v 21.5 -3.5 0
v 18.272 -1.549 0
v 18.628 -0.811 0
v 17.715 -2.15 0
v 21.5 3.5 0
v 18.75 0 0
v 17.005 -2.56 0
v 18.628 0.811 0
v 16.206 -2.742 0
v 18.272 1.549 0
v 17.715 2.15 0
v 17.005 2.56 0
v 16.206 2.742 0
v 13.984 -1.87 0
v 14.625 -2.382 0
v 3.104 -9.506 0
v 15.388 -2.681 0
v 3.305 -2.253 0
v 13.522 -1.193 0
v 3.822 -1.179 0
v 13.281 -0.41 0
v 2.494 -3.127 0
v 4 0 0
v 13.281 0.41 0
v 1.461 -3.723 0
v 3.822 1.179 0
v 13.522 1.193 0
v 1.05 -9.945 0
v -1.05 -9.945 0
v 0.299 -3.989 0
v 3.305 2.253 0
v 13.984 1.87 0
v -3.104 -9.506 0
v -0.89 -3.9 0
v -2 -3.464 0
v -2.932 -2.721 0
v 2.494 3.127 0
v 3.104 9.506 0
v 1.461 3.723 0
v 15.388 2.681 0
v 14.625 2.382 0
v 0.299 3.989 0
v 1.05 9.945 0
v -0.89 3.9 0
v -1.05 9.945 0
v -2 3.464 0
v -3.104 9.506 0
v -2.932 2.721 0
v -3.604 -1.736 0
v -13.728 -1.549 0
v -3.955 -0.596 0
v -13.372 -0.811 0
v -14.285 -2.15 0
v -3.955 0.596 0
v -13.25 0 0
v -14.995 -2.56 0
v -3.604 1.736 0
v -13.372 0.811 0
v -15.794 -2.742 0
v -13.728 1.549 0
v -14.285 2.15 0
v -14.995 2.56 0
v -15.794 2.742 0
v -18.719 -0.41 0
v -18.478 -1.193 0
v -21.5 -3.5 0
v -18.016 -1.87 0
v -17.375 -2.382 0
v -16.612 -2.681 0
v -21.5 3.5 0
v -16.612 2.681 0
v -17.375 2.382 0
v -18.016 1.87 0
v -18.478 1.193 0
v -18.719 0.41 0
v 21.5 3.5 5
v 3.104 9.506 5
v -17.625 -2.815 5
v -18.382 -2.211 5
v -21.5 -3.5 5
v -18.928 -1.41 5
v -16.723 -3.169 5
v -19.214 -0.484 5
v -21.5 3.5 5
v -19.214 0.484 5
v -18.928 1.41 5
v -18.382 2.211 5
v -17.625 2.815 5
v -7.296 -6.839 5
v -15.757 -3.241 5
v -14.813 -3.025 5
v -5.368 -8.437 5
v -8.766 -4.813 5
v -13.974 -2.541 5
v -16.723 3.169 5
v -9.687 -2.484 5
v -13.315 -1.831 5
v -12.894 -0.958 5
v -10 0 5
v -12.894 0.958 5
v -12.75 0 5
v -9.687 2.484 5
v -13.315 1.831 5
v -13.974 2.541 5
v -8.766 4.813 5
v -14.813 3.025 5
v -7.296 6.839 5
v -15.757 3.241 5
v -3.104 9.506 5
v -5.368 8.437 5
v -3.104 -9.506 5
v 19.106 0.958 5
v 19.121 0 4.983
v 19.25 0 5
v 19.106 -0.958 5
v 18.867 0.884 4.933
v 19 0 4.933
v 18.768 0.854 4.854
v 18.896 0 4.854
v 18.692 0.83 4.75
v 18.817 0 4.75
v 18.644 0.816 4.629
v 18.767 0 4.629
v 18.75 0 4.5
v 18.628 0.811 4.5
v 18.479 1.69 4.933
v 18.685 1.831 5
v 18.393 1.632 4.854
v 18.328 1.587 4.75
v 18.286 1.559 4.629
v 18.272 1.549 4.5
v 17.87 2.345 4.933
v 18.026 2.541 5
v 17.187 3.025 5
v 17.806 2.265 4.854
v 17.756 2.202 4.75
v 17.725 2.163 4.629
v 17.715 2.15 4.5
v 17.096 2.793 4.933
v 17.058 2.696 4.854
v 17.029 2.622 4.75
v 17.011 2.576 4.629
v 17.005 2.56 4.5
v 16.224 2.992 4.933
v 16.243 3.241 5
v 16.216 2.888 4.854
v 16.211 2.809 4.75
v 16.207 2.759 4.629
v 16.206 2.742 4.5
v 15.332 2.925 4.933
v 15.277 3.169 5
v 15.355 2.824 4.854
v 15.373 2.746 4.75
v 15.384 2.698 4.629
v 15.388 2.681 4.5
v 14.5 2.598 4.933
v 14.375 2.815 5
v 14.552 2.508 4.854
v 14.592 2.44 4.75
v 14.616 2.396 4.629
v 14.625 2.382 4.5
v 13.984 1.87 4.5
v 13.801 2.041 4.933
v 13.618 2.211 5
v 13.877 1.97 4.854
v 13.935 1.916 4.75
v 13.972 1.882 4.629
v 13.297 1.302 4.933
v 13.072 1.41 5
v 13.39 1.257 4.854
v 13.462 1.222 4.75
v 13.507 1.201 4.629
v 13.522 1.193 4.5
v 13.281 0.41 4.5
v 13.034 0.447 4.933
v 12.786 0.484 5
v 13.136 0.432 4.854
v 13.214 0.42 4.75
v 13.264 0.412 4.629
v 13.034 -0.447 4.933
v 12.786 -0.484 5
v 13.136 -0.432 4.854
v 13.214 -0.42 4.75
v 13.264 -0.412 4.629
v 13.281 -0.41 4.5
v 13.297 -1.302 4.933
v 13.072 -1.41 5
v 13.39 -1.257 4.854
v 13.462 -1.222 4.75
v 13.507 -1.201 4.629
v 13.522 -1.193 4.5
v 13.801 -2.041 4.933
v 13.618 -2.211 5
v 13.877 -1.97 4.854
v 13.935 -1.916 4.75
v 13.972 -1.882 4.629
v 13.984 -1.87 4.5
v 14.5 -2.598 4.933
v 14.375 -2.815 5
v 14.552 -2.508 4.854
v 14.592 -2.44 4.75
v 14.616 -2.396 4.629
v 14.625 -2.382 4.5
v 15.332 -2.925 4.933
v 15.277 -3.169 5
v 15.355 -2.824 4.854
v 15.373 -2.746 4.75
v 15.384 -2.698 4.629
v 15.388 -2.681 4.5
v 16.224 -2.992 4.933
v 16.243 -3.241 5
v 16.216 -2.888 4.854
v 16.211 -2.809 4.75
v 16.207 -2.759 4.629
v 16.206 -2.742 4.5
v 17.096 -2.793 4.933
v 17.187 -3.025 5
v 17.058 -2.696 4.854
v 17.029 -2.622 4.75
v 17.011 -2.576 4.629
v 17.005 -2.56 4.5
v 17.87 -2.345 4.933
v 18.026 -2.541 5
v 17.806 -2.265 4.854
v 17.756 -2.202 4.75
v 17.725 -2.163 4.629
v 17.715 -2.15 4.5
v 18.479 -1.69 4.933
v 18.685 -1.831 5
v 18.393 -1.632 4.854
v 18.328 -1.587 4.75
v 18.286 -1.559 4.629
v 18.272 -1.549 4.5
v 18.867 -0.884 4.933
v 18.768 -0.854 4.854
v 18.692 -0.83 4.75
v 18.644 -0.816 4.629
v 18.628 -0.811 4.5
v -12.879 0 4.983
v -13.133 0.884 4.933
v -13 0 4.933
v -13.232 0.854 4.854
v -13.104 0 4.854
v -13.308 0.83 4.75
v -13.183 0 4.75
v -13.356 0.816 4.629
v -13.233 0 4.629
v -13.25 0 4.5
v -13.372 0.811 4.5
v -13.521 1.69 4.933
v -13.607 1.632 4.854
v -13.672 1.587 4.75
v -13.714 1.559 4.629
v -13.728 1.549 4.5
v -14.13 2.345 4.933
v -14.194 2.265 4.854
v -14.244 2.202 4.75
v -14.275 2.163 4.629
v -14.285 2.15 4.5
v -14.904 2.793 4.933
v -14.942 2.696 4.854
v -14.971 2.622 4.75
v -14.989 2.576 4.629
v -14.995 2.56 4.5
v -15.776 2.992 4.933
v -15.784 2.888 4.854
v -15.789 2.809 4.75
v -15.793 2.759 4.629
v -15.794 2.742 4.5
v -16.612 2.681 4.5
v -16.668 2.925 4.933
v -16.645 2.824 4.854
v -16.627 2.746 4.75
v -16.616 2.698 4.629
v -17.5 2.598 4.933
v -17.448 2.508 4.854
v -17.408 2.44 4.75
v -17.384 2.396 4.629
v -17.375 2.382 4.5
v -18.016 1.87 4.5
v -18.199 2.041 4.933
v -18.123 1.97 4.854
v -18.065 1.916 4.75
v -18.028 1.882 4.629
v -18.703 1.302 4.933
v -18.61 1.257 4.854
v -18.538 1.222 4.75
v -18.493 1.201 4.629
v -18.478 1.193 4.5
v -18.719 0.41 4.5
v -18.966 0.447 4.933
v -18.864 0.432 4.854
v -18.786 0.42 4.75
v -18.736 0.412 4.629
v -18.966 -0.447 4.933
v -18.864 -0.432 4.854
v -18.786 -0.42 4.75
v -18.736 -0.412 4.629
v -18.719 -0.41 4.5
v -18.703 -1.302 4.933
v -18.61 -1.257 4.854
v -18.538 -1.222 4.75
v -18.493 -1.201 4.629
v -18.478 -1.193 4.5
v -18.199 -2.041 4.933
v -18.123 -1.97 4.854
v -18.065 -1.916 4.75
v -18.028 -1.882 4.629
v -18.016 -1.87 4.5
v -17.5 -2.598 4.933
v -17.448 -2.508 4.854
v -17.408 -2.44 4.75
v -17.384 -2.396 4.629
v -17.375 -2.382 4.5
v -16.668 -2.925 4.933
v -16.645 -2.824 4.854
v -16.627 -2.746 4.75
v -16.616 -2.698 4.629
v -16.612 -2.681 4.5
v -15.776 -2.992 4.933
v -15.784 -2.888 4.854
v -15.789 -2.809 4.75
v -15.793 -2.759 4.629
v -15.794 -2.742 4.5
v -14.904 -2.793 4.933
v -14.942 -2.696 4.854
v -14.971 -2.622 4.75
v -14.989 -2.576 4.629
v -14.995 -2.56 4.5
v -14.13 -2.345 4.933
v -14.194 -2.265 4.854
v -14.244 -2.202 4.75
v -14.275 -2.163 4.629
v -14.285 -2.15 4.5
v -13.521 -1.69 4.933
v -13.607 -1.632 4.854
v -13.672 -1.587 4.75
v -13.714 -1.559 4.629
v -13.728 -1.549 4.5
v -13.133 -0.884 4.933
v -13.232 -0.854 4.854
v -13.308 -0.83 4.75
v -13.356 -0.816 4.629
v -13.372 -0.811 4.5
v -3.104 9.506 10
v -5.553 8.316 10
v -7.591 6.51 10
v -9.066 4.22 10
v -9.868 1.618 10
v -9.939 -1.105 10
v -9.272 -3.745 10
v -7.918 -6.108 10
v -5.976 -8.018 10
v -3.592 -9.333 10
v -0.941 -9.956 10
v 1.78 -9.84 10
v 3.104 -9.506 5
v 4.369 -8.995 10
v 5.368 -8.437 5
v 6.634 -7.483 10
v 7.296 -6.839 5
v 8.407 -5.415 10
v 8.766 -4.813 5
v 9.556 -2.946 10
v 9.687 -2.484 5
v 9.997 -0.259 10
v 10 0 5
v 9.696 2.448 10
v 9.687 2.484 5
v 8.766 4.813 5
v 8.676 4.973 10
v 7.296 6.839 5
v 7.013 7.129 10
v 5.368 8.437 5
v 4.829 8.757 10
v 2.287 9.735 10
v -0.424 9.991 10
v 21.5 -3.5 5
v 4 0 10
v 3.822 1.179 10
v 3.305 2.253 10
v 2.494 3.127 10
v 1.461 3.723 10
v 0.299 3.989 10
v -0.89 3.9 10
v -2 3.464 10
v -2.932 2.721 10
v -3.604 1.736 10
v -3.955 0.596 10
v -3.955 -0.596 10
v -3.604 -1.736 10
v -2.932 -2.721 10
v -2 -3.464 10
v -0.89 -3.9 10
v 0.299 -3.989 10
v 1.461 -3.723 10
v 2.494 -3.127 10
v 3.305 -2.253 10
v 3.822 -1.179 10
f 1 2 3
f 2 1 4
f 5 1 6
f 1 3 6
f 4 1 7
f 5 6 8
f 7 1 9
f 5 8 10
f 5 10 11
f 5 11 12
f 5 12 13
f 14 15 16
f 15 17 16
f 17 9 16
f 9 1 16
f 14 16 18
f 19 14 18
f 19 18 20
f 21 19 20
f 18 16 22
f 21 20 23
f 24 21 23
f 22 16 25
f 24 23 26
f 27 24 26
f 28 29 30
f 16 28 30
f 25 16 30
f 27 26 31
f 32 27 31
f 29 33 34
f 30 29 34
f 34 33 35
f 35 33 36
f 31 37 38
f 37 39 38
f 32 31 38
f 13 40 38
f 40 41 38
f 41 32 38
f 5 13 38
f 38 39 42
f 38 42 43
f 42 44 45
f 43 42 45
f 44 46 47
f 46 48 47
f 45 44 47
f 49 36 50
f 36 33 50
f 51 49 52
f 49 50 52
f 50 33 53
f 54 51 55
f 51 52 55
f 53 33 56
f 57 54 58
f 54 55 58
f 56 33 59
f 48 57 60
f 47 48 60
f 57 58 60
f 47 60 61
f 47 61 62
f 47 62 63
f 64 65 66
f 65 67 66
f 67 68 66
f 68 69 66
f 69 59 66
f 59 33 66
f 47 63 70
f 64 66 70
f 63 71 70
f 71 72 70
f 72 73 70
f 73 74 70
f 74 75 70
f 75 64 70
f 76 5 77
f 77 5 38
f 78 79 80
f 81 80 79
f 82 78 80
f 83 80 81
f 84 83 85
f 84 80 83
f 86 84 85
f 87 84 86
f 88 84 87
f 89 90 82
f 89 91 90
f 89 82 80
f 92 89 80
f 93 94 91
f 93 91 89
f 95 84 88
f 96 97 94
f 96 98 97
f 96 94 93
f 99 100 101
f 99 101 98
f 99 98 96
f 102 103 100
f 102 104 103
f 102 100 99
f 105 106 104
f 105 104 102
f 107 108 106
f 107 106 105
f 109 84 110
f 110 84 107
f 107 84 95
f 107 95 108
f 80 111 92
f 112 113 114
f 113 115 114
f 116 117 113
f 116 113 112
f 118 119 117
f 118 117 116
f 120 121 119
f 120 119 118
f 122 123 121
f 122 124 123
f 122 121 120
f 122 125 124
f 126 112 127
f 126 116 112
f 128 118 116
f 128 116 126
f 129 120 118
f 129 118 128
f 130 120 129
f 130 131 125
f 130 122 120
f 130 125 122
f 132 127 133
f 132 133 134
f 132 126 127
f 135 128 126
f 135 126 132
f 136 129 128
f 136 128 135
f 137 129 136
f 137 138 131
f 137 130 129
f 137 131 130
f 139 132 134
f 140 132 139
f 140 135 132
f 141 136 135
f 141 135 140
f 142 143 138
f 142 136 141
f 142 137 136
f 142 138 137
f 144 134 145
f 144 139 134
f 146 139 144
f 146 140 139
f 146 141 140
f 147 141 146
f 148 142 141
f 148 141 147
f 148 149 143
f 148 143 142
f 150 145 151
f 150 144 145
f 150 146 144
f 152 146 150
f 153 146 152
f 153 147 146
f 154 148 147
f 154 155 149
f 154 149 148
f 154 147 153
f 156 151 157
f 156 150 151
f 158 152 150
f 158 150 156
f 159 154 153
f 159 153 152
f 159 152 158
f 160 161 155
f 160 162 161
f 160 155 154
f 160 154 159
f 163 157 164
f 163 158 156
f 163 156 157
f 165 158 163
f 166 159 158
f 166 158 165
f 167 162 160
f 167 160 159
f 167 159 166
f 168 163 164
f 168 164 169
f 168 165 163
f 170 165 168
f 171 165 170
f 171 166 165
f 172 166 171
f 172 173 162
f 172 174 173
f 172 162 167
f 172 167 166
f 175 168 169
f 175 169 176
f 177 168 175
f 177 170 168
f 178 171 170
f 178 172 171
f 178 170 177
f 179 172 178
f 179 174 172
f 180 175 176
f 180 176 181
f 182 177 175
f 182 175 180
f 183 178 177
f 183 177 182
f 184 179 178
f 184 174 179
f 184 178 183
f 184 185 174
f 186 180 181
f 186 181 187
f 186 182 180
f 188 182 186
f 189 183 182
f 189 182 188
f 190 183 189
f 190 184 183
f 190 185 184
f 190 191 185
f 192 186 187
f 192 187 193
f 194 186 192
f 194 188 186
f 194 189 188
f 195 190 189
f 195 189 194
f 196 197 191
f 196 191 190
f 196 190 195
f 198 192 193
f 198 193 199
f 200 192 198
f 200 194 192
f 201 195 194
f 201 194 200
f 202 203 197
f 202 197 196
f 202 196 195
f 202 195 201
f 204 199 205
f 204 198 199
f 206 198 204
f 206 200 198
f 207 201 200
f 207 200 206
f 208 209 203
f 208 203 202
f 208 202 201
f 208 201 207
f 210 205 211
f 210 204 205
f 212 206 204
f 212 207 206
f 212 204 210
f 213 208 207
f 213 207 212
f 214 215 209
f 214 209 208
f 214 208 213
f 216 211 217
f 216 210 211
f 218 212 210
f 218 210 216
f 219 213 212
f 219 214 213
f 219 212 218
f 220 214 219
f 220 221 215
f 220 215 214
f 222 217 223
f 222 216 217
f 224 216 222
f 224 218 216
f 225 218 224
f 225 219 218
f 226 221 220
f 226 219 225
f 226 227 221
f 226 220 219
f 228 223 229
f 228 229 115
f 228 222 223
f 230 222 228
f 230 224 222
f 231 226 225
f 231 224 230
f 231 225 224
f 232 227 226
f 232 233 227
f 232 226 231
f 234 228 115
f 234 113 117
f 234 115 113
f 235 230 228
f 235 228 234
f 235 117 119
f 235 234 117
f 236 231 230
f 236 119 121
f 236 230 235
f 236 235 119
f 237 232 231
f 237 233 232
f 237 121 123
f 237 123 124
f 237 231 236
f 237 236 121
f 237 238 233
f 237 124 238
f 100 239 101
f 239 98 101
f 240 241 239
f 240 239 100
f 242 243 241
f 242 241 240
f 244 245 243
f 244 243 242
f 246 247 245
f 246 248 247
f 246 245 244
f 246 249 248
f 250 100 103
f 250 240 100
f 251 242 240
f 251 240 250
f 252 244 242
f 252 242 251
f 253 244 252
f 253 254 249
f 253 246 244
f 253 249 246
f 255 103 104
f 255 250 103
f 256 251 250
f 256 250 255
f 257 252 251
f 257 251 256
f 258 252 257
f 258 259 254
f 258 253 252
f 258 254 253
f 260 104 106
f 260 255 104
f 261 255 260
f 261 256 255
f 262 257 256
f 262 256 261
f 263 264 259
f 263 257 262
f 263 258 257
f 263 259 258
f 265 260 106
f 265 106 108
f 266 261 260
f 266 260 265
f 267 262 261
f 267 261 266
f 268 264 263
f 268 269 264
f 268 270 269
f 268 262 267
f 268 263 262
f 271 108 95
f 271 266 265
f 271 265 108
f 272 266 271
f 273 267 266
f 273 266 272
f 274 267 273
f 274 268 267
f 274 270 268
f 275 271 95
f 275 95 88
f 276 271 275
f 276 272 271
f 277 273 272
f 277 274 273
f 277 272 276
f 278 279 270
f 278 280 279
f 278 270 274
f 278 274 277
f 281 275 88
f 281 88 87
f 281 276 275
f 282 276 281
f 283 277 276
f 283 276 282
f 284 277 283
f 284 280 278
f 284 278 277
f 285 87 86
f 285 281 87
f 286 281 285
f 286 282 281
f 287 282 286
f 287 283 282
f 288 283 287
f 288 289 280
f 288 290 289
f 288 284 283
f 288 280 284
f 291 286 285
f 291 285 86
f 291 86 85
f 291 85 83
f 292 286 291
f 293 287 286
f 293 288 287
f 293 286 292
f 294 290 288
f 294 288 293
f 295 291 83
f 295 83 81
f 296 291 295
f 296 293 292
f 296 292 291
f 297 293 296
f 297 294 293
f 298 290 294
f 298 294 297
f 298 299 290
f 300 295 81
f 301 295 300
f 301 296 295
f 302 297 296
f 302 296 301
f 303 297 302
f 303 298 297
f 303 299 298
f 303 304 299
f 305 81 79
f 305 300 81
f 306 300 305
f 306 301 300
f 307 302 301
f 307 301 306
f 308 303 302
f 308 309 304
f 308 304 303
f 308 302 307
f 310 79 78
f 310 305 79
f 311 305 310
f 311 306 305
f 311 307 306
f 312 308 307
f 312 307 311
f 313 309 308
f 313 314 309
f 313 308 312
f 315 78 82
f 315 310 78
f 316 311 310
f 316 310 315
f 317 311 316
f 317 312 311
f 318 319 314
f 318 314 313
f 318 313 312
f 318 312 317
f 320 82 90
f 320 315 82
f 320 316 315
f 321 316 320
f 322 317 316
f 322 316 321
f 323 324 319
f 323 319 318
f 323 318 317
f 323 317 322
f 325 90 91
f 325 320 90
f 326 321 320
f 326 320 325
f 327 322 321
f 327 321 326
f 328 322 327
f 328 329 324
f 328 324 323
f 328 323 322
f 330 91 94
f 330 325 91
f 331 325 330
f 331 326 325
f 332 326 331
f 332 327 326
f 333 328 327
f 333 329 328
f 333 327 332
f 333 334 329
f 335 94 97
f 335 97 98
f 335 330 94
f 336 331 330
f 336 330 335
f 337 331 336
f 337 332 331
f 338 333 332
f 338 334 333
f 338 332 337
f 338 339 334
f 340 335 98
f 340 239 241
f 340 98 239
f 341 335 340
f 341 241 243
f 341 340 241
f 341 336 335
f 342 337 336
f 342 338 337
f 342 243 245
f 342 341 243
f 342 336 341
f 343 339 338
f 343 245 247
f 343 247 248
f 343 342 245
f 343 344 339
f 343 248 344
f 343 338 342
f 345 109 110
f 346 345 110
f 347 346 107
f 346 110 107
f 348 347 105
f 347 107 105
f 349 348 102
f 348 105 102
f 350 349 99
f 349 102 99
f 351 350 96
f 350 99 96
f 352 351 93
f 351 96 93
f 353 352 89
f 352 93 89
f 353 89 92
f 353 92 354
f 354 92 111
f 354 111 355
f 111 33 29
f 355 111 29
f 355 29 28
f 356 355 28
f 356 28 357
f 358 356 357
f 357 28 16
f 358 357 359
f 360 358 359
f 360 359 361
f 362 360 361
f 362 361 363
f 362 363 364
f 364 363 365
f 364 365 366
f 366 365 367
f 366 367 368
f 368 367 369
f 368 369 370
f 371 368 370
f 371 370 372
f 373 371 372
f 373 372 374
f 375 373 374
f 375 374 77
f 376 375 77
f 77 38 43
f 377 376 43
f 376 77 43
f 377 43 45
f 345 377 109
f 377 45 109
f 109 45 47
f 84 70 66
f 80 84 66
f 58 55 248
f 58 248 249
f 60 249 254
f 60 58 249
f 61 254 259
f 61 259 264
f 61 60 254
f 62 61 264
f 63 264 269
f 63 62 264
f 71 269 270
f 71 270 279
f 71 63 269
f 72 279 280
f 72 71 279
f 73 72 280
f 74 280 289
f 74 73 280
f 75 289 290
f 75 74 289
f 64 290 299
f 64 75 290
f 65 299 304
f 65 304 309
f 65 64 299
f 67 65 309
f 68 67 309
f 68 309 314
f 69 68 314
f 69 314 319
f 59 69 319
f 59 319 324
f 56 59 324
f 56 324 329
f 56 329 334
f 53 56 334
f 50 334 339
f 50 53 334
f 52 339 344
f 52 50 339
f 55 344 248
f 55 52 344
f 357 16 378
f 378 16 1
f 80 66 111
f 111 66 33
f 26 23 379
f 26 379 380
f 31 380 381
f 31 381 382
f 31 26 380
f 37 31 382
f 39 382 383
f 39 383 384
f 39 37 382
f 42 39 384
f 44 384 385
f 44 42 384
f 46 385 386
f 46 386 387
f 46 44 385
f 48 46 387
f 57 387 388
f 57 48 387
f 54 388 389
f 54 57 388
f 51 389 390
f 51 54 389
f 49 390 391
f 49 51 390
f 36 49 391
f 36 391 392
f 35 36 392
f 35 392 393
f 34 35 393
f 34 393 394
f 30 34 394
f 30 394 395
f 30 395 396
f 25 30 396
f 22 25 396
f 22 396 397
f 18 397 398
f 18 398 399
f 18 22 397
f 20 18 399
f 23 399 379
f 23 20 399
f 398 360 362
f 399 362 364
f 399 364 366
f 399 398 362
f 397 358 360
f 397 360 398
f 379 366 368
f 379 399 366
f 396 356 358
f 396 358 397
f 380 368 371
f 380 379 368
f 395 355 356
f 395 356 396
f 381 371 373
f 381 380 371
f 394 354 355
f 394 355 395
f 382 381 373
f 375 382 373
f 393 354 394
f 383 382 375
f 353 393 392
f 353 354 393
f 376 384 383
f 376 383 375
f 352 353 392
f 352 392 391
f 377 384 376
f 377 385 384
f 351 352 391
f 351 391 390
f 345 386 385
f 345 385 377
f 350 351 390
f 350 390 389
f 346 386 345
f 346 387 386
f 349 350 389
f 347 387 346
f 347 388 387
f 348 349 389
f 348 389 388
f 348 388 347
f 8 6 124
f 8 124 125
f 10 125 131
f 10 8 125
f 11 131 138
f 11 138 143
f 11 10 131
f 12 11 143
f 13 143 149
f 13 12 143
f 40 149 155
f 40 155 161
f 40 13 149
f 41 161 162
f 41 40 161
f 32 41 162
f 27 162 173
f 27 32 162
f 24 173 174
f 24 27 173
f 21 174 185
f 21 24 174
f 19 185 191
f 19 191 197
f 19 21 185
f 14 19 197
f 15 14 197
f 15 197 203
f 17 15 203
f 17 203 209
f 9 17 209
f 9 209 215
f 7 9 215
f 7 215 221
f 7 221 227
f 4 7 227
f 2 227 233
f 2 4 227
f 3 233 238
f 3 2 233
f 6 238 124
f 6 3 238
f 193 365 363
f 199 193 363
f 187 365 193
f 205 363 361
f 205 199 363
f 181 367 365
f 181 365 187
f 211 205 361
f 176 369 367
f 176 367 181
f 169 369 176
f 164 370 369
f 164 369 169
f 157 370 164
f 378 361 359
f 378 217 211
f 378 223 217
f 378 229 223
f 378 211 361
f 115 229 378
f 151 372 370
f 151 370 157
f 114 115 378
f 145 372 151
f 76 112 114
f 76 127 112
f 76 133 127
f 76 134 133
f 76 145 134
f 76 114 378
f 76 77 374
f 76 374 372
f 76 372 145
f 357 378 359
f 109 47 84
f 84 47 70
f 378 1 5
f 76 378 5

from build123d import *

# Parameters (mm, degrees)
SKETCH_1_R        = 2.75
EXTRUDE_1_DEPTH   = 5
EXTRUDE_1_2_DEPTH = 5
SKETCH_2_R        = 10
SKETCH_2_R_2      = 4
EXTRUDE_2_DEPTH   = 10
FILLET_2_R        = 0.5
FILLET_3_R        = 0.5


with BuildPart() as part:
    # 草图1 → 凸台-拉伸1 (new body)
    with BuildSketch(Plane.XY):
        with BuildLine():
            Line((21.5, 3.5), (3.10364576, 9.506176045))
            ThreePointArc((3.10364576, 9.506176045), (8.094333129, 5.872118119), (10, 0))
            ThreePointArc((10, 0), (8.094333129, -5.872118119), (3.10364576, -9.506176045))
            Line((3.10364576, -9.506176045), (21.5, -3.5))
            Line((21.5, -3.5), (21.5, 3.5))
        make_face()
        with Locations((16, 0)):
            Circle(SKETCH_1_R, mode=Mode.SUBTRACT)
    extrude(amount=EXTRUDE_1_DEPTH)



with BuildPart() as body_2:
    # 草图1 → Extrude 1 2 (new body)
    with BuildSketch(Plane.XY):
        with BuildLine():
            Line((-3.10364576, 9.506176045), (-21.5, 3.5))
            Line((-21.5, 3.5), (-21.5, -3.5))
            Line((-21.5, -3.5), (-3.10364576, -9.506176045))
            ThreePointArc((-3.10364576, -9.506176045), (-10, 0), (-3.10364576, 9.506176045))
        make_face()
        with Locations((-16, 0)):
            Circle(SKETCH_1_R, mode=Mode.SUBTRACT)
    extrude(amount=EXTRUDE_1_2_DEPTH)


with BuildPart() as part_1:
    add(part.part)

    add(body_2.part)  # 凸台-拉伸2 merges body 2
    # 草图2 → 凸台-拉伸2 (add)
    with BuildSketch(Plane.XY):
        with Locations(Location((0, 0, 0), (0, 0, 108.081202901))):
            Circle(SKETCH_2_R)
        Circle(SKETCH_2_R_2, mode=Mode.SUBTRACT)
    extrude(amount=EXTRUDE_2_DEPTH)

    # 圆角2
    fillet_2_edges = [part_1.edges().sort_by_distance(p)[0] for p in [
        (-18.75, 0, 5),
    ]]
    fillet(fillet_2_edges, radius=FILLET_2_R)

    # 圆角3
    fillet_3_edges = [part_1.edges().sort_by_distance(p)[0] for p in [
        (13.25, 0, 5),
    ]]
    fillet(fillet_3_edges, radius=FILLET_3_R)


solid = part_1.part
